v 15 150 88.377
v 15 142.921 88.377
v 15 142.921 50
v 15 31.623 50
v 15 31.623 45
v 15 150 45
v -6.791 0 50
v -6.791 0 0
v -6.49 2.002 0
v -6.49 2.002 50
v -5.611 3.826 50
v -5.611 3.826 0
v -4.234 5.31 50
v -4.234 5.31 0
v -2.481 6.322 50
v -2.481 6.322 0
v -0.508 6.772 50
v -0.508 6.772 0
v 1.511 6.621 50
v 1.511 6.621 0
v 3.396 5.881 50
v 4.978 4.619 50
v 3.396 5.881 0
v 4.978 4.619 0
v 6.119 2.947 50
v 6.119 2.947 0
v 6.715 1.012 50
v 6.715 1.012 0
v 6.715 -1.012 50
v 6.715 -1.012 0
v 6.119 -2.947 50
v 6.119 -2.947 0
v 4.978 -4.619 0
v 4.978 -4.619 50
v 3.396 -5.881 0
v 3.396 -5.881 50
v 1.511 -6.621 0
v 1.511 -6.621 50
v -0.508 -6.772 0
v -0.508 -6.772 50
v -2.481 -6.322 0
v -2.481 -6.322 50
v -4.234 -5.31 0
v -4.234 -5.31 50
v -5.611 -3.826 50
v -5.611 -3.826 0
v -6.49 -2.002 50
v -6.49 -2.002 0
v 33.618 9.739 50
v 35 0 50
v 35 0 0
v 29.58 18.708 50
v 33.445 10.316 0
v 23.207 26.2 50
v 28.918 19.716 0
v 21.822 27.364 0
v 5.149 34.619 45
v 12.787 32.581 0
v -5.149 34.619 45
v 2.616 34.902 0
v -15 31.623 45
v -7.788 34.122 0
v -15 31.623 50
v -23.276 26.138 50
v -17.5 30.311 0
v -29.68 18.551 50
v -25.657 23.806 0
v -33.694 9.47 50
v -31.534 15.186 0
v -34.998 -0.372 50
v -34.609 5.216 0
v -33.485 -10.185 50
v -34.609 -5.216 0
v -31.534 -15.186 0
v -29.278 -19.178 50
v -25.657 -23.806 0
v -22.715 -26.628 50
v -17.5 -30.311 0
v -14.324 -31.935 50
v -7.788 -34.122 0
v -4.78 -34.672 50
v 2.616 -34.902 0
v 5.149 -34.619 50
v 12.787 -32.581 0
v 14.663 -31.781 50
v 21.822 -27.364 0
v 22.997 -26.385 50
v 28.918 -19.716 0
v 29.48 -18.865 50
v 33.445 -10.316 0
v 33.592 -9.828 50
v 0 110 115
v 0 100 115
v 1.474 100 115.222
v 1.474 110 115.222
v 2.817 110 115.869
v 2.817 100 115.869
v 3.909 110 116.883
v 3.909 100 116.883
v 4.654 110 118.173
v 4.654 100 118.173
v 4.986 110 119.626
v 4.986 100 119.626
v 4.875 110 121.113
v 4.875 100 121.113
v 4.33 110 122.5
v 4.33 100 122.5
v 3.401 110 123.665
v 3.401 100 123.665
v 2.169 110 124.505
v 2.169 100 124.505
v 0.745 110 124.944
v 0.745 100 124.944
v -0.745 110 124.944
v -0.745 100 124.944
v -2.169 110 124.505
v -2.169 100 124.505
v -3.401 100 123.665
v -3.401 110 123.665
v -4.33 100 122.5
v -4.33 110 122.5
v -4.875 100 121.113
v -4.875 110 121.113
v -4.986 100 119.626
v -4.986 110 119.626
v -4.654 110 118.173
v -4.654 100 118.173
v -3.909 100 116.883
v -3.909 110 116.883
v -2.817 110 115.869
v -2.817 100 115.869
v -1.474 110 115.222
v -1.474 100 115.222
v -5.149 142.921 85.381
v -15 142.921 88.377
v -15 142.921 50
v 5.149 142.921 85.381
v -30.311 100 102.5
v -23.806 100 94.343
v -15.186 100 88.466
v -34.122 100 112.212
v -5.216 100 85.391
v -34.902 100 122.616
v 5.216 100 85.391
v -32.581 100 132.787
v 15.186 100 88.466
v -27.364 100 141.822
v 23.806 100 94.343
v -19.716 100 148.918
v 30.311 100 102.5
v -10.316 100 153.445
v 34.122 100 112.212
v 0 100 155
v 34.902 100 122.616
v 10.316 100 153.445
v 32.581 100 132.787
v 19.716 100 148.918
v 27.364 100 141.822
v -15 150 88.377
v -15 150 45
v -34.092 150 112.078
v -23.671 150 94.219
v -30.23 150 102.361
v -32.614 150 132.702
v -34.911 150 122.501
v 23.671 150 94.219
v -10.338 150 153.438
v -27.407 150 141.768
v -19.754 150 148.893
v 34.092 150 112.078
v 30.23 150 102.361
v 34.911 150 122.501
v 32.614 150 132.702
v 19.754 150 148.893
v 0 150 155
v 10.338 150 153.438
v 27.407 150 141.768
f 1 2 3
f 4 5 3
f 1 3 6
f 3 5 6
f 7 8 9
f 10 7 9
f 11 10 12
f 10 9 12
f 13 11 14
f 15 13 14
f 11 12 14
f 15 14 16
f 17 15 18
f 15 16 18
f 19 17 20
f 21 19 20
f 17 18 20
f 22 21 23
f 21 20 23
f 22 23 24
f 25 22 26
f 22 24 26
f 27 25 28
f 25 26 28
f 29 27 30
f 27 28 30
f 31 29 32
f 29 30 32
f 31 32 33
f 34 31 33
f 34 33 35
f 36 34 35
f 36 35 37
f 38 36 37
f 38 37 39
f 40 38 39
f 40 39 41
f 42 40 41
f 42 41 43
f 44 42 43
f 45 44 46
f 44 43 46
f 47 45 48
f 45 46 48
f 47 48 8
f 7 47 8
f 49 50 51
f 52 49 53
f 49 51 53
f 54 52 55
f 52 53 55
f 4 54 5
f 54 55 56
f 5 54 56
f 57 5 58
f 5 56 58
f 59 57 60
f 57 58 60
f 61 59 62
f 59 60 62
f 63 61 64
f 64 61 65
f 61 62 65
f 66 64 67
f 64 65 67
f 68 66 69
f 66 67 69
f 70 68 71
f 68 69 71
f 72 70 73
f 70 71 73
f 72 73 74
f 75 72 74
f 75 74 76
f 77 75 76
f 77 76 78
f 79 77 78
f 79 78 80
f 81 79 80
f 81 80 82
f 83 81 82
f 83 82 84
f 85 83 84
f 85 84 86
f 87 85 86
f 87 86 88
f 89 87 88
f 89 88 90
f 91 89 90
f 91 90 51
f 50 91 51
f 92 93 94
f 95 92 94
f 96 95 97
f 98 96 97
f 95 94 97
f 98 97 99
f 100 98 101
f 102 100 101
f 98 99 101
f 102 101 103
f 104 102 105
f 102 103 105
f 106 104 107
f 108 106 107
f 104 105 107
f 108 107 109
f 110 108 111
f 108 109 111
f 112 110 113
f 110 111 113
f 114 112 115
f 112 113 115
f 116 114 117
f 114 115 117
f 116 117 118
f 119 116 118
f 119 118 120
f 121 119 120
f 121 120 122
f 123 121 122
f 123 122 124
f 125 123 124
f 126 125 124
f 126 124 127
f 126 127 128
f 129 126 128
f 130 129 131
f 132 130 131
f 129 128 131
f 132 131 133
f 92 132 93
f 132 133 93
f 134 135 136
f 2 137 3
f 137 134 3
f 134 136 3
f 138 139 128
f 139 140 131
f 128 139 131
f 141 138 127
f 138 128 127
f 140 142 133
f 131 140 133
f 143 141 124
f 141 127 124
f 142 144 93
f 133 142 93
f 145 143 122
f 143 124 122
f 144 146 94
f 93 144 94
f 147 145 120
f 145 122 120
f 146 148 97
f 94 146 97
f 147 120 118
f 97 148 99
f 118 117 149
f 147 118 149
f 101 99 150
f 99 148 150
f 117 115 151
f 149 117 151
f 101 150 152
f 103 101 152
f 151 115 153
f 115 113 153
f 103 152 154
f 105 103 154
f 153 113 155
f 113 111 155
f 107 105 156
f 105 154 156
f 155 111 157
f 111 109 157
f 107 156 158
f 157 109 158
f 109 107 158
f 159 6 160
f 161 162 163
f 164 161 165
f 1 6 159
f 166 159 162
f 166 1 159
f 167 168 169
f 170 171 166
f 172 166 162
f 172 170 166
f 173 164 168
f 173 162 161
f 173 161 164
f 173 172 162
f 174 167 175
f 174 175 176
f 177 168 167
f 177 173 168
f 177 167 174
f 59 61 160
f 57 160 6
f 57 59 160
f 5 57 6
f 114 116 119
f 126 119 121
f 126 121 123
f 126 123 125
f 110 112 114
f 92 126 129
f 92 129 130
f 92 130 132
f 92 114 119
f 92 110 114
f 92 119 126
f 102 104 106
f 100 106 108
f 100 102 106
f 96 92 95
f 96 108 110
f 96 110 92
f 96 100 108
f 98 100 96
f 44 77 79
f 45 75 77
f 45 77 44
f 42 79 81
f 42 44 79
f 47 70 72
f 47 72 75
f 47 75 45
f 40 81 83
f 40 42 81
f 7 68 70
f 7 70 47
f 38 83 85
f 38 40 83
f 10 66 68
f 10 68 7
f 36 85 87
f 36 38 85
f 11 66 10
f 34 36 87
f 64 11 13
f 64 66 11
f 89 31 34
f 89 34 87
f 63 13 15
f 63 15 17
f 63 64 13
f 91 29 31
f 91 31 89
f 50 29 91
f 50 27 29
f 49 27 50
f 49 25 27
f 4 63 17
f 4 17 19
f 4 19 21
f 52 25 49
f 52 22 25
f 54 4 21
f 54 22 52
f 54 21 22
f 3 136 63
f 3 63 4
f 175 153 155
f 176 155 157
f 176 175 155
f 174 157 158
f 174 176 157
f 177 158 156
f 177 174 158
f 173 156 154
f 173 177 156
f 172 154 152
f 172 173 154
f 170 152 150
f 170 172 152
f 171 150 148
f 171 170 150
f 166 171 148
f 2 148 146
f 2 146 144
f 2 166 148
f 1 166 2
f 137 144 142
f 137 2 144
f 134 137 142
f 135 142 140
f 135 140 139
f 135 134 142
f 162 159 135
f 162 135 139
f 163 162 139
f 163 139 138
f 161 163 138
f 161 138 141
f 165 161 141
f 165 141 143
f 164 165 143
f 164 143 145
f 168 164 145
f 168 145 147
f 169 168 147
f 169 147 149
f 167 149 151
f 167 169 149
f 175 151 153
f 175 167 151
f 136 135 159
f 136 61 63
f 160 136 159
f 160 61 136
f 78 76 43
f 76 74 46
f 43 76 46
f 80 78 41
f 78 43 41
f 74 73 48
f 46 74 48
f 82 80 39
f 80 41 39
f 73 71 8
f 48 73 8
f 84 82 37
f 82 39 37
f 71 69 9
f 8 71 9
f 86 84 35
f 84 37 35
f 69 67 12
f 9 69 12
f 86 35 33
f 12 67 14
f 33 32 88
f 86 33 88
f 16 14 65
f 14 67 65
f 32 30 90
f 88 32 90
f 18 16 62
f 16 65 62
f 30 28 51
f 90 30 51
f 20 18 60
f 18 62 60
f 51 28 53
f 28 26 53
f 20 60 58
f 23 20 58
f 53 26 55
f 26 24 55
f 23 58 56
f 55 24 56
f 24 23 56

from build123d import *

# Parameters (mm, degrees)
SKETCH1_R           = 35
BOSS_EXTRUDE1_DEPTH = 50
SKETCH2_W           = 30
SKETCH2_H           = 5
BOSS_EXTRUDE2_DEPTH = 150
SKETCH3_W           = 30
SKETCH3_H           = 7.079136618
BOSS_EXTRUDE3_DEPTH = 70
SKETCH5_R           = 35
BOSS_EXTRUDE4_DEPTH = 50
SKETCH6_R           = 6.791338944
CUT_EXTRUDE1_DEPTH  = 50
SKETCH7_R           = 5
CUT_EXTRUDE2_DEPTH  = 10


with BuildPart() as part:
    # Sketch1 → Boss-Extrude1 (new body)
    with BuildSketch(Plane.XY):
        Circle(SKETCH1_R)
    extrude(amount=BOSS_EXTRUDE1_DEPTH)

    # Sketch2 → Boss-Extrude2 (add)
    with BuildSketch(Plane(origin=(0, 0, 0), x_dir=(1, 0, 0), z_dir=(0, 1, 0))):
        with Locations((0, -47.5)):
            Rectangle(SKETCH2_W, SKETCH2_H)
    extrude(amount=BOSS_EXTRUDE2_DEPTH)

    # Sketch3 → Boss-Extrude3 (add)
    with BuildSketch(Plane.XY.offset(50)):
        with Locations((0, 146.460431691)):
            Rectangle(SKETCH3_W, SKETCH3_H)
    extrude(amount=BOSS_EXTRUDE3_DEPTH)

    # Sketch5 → Boss-Extrude4 (add)
    with BuildSketch(Plane(origin=(0, 150, 0), x_dir=(1, 0, 0), z_dir=(0, 1, 0))):
        with Locations(Location((0, -120, 0), (0, 0, 270))):
            Circle(SKETCH5_R)
    extrude(amount=-BOSS_EXTRUDE4_DEPTH)

    # Sketch6 → Cut-Extrude1 (cut)
    with BuildSketch(Plane(origin=(0, 0, 0), x_dir=(-1, 0, 0), z_dir=(0, 0, -1))):
        Circle(SKETCH6_R)
    extrude(amount=-CUT_EXTRUDE1_DEPTH, mode=Mode.SUBTRACT)

    # Sketch7 → Cut-Extrude2 (cut)
    with BuildSketch(Plane.XZ.offset(-100)):
        with Locations(Location((0, 120, 0), (0, 0, 270))):
            Circle(SKETCH7_R)
    extrude(amount=-CUT_EXTRUDE2_DEPTH, mode=Mode.SUBTRACT)


solid = part.part
